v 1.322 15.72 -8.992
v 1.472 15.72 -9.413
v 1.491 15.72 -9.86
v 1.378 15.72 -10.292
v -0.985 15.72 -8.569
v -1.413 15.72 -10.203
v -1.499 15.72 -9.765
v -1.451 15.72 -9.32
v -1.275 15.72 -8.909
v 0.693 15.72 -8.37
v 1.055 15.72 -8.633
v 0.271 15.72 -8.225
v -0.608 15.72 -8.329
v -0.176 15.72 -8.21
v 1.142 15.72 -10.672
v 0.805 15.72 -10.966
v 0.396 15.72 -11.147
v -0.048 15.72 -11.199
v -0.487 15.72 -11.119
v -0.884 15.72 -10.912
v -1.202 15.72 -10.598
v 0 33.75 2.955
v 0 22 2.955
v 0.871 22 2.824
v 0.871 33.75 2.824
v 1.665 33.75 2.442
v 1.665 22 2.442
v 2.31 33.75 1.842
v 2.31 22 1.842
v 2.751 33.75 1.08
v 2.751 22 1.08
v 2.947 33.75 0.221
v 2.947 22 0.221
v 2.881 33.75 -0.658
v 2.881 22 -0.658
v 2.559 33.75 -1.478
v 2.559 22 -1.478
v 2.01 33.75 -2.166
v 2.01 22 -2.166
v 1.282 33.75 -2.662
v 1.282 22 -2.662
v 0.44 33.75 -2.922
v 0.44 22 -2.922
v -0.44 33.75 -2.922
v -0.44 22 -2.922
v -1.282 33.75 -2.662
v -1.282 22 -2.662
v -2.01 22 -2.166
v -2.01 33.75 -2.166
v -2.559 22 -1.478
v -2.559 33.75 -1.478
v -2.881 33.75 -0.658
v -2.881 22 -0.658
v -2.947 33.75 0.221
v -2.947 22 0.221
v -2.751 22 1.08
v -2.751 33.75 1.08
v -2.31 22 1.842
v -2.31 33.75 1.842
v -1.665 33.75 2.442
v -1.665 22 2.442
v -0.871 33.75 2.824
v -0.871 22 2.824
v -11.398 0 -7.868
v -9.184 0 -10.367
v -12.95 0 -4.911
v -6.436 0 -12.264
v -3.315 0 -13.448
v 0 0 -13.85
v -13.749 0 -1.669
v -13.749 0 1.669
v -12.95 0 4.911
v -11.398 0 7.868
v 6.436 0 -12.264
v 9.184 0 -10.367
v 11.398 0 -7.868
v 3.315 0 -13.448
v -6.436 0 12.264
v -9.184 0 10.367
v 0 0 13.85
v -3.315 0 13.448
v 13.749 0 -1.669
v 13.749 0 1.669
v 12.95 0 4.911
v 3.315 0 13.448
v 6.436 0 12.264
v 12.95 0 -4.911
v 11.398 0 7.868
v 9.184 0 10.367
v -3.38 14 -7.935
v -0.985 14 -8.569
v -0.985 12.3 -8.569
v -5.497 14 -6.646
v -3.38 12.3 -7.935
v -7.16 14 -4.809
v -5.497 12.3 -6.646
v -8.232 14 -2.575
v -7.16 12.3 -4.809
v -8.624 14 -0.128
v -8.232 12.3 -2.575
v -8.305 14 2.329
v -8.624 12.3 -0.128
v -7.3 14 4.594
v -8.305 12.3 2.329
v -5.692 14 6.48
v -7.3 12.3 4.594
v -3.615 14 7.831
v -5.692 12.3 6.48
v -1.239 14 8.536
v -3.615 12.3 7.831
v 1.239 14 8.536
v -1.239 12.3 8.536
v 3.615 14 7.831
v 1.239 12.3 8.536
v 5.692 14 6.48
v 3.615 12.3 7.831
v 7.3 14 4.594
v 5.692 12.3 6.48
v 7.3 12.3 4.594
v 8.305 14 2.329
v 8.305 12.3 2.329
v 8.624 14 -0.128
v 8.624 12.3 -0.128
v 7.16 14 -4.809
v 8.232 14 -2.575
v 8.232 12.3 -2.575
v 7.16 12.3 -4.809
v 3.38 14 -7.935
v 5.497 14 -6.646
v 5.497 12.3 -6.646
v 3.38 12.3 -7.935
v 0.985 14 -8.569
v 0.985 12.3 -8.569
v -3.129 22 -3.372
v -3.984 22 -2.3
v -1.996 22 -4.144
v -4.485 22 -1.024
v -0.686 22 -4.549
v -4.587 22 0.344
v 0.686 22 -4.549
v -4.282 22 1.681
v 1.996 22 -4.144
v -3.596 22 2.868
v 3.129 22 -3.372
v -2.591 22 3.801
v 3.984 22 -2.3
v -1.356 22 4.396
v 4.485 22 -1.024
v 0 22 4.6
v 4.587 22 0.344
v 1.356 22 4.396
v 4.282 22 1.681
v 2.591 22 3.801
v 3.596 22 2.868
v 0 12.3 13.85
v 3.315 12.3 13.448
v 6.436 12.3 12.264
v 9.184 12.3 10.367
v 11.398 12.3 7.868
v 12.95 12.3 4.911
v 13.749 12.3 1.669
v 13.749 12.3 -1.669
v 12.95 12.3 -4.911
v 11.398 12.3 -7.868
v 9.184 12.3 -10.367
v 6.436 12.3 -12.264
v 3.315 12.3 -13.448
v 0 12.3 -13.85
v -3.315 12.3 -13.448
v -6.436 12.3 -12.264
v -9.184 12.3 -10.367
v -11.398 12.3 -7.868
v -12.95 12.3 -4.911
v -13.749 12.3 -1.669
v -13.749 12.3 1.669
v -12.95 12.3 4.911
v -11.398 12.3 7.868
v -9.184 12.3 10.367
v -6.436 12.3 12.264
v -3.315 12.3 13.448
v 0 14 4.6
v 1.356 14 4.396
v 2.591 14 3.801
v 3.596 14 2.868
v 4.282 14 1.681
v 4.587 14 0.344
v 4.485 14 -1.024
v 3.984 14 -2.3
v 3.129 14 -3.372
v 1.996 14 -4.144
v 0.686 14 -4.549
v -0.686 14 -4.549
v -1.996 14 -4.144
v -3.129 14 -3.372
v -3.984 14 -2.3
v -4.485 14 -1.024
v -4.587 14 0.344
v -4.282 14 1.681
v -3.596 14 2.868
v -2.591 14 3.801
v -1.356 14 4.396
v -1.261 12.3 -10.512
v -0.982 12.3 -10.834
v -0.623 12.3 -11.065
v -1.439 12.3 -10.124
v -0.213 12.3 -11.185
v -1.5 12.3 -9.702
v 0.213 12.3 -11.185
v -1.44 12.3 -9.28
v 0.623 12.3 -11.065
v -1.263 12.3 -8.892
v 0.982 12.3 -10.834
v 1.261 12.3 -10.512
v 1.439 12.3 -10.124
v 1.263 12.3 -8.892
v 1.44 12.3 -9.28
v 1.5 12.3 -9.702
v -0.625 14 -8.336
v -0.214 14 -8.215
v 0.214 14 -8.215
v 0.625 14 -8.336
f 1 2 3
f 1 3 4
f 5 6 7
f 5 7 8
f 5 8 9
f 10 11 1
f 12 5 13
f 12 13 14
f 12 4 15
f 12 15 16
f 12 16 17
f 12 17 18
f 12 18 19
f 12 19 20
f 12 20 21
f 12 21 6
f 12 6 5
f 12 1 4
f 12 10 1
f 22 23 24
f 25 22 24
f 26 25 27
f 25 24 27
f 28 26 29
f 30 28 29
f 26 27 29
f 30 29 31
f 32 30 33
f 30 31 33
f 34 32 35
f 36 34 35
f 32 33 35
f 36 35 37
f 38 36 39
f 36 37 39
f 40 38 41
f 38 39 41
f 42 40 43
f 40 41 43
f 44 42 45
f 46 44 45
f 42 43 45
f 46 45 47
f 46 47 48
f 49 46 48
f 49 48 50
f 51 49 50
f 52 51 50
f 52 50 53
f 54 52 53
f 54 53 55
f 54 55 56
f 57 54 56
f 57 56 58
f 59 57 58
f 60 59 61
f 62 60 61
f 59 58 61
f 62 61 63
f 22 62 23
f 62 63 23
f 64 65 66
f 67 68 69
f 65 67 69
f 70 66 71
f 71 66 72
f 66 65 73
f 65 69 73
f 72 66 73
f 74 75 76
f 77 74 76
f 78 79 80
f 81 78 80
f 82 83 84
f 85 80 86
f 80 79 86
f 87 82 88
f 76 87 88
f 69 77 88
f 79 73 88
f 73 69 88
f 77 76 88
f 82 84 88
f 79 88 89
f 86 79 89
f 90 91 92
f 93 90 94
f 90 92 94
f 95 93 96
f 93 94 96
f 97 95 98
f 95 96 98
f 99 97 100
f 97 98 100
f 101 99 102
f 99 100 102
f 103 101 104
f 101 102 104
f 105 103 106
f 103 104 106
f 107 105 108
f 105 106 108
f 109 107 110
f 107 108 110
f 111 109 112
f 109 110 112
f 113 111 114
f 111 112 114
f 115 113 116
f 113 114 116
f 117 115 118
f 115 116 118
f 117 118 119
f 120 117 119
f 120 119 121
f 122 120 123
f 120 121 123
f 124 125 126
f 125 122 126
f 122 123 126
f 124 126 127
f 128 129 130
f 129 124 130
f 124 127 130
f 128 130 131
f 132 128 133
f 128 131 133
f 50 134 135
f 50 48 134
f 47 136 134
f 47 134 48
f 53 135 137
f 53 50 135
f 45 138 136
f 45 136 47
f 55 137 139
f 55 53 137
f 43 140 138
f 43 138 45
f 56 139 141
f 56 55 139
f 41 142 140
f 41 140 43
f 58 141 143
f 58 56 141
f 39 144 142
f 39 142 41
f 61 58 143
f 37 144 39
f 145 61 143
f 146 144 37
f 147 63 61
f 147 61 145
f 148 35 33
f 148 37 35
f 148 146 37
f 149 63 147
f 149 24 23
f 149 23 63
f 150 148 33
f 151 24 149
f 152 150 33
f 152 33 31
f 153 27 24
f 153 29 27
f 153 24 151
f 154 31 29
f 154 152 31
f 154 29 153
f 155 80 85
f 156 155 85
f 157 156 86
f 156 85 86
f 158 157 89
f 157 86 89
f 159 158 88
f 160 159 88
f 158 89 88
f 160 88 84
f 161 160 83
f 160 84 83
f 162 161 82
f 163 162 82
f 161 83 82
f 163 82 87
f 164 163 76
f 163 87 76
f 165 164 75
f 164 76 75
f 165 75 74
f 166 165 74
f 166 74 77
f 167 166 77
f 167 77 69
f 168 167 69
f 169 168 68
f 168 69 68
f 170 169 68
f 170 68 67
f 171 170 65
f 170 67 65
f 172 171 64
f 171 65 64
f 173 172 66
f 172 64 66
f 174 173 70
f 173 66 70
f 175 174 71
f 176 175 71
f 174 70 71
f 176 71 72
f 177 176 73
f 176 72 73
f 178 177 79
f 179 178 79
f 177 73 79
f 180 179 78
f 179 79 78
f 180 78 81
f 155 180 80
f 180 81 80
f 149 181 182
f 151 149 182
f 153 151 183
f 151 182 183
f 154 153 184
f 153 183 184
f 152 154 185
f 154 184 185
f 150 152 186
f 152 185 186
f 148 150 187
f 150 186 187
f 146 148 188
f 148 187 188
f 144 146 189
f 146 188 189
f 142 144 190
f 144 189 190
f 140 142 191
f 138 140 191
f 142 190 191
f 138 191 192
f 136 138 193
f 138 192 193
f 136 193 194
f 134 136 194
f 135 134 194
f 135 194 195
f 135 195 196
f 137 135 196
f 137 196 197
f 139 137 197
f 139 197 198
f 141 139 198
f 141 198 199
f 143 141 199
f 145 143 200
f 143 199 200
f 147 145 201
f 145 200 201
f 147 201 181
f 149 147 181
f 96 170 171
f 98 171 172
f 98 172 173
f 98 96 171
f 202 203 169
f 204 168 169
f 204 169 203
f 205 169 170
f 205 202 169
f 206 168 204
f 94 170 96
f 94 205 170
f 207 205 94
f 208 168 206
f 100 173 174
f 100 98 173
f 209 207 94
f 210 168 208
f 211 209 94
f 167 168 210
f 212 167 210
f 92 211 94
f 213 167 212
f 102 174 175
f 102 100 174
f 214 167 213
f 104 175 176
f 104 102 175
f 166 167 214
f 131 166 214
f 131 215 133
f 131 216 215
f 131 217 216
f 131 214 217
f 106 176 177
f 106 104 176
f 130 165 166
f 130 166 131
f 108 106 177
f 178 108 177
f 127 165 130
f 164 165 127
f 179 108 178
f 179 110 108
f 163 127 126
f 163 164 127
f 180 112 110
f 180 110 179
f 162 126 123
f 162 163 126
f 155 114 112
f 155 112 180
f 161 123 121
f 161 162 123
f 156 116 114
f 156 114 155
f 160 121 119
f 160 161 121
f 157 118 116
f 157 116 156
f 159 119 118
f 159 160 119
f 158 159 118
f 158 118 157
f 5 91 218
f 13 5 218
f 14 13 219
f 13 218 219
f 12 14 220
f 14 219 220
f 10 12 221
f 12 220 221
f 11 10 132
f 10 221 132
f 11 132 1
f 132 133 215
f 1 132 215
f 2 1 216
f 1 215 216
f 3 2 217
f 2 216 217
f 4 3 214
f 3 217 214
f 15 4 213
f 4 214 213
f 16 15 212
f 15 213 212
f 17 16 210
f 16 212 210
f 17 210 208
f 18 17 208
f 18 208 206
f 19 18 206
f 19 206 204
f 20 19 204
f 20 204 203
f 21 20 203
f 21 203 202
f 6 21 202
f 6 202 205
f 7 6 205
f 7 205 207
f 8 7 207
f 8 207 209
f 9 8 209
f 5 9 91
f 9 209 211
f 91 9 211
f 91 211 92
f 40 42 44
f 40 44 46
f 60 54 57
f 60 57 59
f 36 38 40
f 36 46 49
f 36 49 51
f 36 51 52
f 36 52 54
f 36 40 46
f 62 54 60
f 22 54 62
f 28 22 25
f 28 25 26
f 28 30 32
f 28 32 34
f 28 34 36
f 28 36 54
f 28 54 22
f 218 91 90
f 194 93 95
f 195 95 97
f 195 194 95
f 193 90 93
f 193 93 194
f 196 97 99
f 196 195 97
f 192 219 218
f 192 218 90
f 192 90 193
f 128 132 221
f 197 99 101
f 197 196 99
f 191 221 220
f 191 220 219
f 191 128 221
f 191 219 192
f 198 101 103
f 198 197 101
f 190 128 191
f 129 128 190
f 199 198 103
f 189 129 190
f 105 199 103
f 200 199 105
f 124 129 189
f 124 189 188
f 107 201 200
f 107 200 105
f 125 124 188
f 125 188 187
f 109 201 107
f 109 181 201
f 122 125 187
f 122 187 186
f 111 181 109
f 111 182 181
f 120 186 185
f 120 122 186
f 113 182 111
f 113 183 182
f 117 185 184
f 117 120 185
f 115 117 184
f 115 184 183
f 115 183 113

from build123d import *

# Parameters (mm, degrees)
SKETCH1_R           = 13.85
BOSS_EXTRUDE1_DEPTH = 12.3
SKETCH2_R           = 8.625
BOSS_EXTRUDE2_DEPTH = 1.7
SKETCH3_R           = 4.6
BOSS_EXTRUDE3_DEPTH = 8
SKETCH4_R           = 2.955
BOSS_EXTRUDE4_DEPTH = 11.75
SKETCH5_R           = 1.5
BOSS_EXTRUDE5_DEPTH = 3.42


with BuildPart() as part:
    # Sketch1 → Boss-Extrude1 (new body)
    with BuildSketch(Plane(origin=(0, 0, 0), x_dir=(1, 0, 0), z_dir=(0, 1, 0))):
        with Locations(Location((0, 0, 0), (0, 0, 270))):
            Circle(SKETCH1_R)
    extrude(amount=BOSS_EXTRUDE1_DEPTH)

    # Sketch2 → Boss-Extrude2 (add)
    with BuildSketch(Plane(origin=(0, 12.3, 0), x_dir=(1, 0, 0), z_dir=(0, 1, 0))):
        with Locations(Location((0, 0, 0), (0, 0, 270))):
            Circle(SKETCH2_R)
    extrude(amount=BOSS_EXTRUDE2_DEPTH)

    # Sketch3 → Boss-Extrude3 (add)
    with BuildSketch(Plane(origin=(0, 14, 0), x_dir=(1, 0, 0), z_dir=(0, 1, 0))):
        with Locations(Location((0, 0, 0), (0, 0, 270))):
            Circle(SKETCH3_R)
    extrude(amount=BOSS_EXTRUDE3_DEPTH)

    # Sketch4 → Boss-Extrude4 (add)
    with BuildSketch(Plane(origin=(0, 22, 0), x_dir=(1, 0, 0), z_dir=(0, 1, 0))):
        with Locations(Location((0, 0, 0), (0, 0, 270))):
            Circle(SKETCH4_R)
    extrude(amount=BOSS_EXTRUDE4_DEPTH)

    # Sketch5 → Boss-Extrude5 (add)
    with BuildSketch(Plane(origin=(0, 12.3, 0), x_dir=(1, 0, 0), z_dir=(0, 1, 0))):
        with Locations(Location((0, 9.7, 0), (0, 0, 228.961978667))):
            Circle(SKETCH5_R)
    extrude(amount=BOSS_EXTRUDE5_DEPTH)


solid = part.part
